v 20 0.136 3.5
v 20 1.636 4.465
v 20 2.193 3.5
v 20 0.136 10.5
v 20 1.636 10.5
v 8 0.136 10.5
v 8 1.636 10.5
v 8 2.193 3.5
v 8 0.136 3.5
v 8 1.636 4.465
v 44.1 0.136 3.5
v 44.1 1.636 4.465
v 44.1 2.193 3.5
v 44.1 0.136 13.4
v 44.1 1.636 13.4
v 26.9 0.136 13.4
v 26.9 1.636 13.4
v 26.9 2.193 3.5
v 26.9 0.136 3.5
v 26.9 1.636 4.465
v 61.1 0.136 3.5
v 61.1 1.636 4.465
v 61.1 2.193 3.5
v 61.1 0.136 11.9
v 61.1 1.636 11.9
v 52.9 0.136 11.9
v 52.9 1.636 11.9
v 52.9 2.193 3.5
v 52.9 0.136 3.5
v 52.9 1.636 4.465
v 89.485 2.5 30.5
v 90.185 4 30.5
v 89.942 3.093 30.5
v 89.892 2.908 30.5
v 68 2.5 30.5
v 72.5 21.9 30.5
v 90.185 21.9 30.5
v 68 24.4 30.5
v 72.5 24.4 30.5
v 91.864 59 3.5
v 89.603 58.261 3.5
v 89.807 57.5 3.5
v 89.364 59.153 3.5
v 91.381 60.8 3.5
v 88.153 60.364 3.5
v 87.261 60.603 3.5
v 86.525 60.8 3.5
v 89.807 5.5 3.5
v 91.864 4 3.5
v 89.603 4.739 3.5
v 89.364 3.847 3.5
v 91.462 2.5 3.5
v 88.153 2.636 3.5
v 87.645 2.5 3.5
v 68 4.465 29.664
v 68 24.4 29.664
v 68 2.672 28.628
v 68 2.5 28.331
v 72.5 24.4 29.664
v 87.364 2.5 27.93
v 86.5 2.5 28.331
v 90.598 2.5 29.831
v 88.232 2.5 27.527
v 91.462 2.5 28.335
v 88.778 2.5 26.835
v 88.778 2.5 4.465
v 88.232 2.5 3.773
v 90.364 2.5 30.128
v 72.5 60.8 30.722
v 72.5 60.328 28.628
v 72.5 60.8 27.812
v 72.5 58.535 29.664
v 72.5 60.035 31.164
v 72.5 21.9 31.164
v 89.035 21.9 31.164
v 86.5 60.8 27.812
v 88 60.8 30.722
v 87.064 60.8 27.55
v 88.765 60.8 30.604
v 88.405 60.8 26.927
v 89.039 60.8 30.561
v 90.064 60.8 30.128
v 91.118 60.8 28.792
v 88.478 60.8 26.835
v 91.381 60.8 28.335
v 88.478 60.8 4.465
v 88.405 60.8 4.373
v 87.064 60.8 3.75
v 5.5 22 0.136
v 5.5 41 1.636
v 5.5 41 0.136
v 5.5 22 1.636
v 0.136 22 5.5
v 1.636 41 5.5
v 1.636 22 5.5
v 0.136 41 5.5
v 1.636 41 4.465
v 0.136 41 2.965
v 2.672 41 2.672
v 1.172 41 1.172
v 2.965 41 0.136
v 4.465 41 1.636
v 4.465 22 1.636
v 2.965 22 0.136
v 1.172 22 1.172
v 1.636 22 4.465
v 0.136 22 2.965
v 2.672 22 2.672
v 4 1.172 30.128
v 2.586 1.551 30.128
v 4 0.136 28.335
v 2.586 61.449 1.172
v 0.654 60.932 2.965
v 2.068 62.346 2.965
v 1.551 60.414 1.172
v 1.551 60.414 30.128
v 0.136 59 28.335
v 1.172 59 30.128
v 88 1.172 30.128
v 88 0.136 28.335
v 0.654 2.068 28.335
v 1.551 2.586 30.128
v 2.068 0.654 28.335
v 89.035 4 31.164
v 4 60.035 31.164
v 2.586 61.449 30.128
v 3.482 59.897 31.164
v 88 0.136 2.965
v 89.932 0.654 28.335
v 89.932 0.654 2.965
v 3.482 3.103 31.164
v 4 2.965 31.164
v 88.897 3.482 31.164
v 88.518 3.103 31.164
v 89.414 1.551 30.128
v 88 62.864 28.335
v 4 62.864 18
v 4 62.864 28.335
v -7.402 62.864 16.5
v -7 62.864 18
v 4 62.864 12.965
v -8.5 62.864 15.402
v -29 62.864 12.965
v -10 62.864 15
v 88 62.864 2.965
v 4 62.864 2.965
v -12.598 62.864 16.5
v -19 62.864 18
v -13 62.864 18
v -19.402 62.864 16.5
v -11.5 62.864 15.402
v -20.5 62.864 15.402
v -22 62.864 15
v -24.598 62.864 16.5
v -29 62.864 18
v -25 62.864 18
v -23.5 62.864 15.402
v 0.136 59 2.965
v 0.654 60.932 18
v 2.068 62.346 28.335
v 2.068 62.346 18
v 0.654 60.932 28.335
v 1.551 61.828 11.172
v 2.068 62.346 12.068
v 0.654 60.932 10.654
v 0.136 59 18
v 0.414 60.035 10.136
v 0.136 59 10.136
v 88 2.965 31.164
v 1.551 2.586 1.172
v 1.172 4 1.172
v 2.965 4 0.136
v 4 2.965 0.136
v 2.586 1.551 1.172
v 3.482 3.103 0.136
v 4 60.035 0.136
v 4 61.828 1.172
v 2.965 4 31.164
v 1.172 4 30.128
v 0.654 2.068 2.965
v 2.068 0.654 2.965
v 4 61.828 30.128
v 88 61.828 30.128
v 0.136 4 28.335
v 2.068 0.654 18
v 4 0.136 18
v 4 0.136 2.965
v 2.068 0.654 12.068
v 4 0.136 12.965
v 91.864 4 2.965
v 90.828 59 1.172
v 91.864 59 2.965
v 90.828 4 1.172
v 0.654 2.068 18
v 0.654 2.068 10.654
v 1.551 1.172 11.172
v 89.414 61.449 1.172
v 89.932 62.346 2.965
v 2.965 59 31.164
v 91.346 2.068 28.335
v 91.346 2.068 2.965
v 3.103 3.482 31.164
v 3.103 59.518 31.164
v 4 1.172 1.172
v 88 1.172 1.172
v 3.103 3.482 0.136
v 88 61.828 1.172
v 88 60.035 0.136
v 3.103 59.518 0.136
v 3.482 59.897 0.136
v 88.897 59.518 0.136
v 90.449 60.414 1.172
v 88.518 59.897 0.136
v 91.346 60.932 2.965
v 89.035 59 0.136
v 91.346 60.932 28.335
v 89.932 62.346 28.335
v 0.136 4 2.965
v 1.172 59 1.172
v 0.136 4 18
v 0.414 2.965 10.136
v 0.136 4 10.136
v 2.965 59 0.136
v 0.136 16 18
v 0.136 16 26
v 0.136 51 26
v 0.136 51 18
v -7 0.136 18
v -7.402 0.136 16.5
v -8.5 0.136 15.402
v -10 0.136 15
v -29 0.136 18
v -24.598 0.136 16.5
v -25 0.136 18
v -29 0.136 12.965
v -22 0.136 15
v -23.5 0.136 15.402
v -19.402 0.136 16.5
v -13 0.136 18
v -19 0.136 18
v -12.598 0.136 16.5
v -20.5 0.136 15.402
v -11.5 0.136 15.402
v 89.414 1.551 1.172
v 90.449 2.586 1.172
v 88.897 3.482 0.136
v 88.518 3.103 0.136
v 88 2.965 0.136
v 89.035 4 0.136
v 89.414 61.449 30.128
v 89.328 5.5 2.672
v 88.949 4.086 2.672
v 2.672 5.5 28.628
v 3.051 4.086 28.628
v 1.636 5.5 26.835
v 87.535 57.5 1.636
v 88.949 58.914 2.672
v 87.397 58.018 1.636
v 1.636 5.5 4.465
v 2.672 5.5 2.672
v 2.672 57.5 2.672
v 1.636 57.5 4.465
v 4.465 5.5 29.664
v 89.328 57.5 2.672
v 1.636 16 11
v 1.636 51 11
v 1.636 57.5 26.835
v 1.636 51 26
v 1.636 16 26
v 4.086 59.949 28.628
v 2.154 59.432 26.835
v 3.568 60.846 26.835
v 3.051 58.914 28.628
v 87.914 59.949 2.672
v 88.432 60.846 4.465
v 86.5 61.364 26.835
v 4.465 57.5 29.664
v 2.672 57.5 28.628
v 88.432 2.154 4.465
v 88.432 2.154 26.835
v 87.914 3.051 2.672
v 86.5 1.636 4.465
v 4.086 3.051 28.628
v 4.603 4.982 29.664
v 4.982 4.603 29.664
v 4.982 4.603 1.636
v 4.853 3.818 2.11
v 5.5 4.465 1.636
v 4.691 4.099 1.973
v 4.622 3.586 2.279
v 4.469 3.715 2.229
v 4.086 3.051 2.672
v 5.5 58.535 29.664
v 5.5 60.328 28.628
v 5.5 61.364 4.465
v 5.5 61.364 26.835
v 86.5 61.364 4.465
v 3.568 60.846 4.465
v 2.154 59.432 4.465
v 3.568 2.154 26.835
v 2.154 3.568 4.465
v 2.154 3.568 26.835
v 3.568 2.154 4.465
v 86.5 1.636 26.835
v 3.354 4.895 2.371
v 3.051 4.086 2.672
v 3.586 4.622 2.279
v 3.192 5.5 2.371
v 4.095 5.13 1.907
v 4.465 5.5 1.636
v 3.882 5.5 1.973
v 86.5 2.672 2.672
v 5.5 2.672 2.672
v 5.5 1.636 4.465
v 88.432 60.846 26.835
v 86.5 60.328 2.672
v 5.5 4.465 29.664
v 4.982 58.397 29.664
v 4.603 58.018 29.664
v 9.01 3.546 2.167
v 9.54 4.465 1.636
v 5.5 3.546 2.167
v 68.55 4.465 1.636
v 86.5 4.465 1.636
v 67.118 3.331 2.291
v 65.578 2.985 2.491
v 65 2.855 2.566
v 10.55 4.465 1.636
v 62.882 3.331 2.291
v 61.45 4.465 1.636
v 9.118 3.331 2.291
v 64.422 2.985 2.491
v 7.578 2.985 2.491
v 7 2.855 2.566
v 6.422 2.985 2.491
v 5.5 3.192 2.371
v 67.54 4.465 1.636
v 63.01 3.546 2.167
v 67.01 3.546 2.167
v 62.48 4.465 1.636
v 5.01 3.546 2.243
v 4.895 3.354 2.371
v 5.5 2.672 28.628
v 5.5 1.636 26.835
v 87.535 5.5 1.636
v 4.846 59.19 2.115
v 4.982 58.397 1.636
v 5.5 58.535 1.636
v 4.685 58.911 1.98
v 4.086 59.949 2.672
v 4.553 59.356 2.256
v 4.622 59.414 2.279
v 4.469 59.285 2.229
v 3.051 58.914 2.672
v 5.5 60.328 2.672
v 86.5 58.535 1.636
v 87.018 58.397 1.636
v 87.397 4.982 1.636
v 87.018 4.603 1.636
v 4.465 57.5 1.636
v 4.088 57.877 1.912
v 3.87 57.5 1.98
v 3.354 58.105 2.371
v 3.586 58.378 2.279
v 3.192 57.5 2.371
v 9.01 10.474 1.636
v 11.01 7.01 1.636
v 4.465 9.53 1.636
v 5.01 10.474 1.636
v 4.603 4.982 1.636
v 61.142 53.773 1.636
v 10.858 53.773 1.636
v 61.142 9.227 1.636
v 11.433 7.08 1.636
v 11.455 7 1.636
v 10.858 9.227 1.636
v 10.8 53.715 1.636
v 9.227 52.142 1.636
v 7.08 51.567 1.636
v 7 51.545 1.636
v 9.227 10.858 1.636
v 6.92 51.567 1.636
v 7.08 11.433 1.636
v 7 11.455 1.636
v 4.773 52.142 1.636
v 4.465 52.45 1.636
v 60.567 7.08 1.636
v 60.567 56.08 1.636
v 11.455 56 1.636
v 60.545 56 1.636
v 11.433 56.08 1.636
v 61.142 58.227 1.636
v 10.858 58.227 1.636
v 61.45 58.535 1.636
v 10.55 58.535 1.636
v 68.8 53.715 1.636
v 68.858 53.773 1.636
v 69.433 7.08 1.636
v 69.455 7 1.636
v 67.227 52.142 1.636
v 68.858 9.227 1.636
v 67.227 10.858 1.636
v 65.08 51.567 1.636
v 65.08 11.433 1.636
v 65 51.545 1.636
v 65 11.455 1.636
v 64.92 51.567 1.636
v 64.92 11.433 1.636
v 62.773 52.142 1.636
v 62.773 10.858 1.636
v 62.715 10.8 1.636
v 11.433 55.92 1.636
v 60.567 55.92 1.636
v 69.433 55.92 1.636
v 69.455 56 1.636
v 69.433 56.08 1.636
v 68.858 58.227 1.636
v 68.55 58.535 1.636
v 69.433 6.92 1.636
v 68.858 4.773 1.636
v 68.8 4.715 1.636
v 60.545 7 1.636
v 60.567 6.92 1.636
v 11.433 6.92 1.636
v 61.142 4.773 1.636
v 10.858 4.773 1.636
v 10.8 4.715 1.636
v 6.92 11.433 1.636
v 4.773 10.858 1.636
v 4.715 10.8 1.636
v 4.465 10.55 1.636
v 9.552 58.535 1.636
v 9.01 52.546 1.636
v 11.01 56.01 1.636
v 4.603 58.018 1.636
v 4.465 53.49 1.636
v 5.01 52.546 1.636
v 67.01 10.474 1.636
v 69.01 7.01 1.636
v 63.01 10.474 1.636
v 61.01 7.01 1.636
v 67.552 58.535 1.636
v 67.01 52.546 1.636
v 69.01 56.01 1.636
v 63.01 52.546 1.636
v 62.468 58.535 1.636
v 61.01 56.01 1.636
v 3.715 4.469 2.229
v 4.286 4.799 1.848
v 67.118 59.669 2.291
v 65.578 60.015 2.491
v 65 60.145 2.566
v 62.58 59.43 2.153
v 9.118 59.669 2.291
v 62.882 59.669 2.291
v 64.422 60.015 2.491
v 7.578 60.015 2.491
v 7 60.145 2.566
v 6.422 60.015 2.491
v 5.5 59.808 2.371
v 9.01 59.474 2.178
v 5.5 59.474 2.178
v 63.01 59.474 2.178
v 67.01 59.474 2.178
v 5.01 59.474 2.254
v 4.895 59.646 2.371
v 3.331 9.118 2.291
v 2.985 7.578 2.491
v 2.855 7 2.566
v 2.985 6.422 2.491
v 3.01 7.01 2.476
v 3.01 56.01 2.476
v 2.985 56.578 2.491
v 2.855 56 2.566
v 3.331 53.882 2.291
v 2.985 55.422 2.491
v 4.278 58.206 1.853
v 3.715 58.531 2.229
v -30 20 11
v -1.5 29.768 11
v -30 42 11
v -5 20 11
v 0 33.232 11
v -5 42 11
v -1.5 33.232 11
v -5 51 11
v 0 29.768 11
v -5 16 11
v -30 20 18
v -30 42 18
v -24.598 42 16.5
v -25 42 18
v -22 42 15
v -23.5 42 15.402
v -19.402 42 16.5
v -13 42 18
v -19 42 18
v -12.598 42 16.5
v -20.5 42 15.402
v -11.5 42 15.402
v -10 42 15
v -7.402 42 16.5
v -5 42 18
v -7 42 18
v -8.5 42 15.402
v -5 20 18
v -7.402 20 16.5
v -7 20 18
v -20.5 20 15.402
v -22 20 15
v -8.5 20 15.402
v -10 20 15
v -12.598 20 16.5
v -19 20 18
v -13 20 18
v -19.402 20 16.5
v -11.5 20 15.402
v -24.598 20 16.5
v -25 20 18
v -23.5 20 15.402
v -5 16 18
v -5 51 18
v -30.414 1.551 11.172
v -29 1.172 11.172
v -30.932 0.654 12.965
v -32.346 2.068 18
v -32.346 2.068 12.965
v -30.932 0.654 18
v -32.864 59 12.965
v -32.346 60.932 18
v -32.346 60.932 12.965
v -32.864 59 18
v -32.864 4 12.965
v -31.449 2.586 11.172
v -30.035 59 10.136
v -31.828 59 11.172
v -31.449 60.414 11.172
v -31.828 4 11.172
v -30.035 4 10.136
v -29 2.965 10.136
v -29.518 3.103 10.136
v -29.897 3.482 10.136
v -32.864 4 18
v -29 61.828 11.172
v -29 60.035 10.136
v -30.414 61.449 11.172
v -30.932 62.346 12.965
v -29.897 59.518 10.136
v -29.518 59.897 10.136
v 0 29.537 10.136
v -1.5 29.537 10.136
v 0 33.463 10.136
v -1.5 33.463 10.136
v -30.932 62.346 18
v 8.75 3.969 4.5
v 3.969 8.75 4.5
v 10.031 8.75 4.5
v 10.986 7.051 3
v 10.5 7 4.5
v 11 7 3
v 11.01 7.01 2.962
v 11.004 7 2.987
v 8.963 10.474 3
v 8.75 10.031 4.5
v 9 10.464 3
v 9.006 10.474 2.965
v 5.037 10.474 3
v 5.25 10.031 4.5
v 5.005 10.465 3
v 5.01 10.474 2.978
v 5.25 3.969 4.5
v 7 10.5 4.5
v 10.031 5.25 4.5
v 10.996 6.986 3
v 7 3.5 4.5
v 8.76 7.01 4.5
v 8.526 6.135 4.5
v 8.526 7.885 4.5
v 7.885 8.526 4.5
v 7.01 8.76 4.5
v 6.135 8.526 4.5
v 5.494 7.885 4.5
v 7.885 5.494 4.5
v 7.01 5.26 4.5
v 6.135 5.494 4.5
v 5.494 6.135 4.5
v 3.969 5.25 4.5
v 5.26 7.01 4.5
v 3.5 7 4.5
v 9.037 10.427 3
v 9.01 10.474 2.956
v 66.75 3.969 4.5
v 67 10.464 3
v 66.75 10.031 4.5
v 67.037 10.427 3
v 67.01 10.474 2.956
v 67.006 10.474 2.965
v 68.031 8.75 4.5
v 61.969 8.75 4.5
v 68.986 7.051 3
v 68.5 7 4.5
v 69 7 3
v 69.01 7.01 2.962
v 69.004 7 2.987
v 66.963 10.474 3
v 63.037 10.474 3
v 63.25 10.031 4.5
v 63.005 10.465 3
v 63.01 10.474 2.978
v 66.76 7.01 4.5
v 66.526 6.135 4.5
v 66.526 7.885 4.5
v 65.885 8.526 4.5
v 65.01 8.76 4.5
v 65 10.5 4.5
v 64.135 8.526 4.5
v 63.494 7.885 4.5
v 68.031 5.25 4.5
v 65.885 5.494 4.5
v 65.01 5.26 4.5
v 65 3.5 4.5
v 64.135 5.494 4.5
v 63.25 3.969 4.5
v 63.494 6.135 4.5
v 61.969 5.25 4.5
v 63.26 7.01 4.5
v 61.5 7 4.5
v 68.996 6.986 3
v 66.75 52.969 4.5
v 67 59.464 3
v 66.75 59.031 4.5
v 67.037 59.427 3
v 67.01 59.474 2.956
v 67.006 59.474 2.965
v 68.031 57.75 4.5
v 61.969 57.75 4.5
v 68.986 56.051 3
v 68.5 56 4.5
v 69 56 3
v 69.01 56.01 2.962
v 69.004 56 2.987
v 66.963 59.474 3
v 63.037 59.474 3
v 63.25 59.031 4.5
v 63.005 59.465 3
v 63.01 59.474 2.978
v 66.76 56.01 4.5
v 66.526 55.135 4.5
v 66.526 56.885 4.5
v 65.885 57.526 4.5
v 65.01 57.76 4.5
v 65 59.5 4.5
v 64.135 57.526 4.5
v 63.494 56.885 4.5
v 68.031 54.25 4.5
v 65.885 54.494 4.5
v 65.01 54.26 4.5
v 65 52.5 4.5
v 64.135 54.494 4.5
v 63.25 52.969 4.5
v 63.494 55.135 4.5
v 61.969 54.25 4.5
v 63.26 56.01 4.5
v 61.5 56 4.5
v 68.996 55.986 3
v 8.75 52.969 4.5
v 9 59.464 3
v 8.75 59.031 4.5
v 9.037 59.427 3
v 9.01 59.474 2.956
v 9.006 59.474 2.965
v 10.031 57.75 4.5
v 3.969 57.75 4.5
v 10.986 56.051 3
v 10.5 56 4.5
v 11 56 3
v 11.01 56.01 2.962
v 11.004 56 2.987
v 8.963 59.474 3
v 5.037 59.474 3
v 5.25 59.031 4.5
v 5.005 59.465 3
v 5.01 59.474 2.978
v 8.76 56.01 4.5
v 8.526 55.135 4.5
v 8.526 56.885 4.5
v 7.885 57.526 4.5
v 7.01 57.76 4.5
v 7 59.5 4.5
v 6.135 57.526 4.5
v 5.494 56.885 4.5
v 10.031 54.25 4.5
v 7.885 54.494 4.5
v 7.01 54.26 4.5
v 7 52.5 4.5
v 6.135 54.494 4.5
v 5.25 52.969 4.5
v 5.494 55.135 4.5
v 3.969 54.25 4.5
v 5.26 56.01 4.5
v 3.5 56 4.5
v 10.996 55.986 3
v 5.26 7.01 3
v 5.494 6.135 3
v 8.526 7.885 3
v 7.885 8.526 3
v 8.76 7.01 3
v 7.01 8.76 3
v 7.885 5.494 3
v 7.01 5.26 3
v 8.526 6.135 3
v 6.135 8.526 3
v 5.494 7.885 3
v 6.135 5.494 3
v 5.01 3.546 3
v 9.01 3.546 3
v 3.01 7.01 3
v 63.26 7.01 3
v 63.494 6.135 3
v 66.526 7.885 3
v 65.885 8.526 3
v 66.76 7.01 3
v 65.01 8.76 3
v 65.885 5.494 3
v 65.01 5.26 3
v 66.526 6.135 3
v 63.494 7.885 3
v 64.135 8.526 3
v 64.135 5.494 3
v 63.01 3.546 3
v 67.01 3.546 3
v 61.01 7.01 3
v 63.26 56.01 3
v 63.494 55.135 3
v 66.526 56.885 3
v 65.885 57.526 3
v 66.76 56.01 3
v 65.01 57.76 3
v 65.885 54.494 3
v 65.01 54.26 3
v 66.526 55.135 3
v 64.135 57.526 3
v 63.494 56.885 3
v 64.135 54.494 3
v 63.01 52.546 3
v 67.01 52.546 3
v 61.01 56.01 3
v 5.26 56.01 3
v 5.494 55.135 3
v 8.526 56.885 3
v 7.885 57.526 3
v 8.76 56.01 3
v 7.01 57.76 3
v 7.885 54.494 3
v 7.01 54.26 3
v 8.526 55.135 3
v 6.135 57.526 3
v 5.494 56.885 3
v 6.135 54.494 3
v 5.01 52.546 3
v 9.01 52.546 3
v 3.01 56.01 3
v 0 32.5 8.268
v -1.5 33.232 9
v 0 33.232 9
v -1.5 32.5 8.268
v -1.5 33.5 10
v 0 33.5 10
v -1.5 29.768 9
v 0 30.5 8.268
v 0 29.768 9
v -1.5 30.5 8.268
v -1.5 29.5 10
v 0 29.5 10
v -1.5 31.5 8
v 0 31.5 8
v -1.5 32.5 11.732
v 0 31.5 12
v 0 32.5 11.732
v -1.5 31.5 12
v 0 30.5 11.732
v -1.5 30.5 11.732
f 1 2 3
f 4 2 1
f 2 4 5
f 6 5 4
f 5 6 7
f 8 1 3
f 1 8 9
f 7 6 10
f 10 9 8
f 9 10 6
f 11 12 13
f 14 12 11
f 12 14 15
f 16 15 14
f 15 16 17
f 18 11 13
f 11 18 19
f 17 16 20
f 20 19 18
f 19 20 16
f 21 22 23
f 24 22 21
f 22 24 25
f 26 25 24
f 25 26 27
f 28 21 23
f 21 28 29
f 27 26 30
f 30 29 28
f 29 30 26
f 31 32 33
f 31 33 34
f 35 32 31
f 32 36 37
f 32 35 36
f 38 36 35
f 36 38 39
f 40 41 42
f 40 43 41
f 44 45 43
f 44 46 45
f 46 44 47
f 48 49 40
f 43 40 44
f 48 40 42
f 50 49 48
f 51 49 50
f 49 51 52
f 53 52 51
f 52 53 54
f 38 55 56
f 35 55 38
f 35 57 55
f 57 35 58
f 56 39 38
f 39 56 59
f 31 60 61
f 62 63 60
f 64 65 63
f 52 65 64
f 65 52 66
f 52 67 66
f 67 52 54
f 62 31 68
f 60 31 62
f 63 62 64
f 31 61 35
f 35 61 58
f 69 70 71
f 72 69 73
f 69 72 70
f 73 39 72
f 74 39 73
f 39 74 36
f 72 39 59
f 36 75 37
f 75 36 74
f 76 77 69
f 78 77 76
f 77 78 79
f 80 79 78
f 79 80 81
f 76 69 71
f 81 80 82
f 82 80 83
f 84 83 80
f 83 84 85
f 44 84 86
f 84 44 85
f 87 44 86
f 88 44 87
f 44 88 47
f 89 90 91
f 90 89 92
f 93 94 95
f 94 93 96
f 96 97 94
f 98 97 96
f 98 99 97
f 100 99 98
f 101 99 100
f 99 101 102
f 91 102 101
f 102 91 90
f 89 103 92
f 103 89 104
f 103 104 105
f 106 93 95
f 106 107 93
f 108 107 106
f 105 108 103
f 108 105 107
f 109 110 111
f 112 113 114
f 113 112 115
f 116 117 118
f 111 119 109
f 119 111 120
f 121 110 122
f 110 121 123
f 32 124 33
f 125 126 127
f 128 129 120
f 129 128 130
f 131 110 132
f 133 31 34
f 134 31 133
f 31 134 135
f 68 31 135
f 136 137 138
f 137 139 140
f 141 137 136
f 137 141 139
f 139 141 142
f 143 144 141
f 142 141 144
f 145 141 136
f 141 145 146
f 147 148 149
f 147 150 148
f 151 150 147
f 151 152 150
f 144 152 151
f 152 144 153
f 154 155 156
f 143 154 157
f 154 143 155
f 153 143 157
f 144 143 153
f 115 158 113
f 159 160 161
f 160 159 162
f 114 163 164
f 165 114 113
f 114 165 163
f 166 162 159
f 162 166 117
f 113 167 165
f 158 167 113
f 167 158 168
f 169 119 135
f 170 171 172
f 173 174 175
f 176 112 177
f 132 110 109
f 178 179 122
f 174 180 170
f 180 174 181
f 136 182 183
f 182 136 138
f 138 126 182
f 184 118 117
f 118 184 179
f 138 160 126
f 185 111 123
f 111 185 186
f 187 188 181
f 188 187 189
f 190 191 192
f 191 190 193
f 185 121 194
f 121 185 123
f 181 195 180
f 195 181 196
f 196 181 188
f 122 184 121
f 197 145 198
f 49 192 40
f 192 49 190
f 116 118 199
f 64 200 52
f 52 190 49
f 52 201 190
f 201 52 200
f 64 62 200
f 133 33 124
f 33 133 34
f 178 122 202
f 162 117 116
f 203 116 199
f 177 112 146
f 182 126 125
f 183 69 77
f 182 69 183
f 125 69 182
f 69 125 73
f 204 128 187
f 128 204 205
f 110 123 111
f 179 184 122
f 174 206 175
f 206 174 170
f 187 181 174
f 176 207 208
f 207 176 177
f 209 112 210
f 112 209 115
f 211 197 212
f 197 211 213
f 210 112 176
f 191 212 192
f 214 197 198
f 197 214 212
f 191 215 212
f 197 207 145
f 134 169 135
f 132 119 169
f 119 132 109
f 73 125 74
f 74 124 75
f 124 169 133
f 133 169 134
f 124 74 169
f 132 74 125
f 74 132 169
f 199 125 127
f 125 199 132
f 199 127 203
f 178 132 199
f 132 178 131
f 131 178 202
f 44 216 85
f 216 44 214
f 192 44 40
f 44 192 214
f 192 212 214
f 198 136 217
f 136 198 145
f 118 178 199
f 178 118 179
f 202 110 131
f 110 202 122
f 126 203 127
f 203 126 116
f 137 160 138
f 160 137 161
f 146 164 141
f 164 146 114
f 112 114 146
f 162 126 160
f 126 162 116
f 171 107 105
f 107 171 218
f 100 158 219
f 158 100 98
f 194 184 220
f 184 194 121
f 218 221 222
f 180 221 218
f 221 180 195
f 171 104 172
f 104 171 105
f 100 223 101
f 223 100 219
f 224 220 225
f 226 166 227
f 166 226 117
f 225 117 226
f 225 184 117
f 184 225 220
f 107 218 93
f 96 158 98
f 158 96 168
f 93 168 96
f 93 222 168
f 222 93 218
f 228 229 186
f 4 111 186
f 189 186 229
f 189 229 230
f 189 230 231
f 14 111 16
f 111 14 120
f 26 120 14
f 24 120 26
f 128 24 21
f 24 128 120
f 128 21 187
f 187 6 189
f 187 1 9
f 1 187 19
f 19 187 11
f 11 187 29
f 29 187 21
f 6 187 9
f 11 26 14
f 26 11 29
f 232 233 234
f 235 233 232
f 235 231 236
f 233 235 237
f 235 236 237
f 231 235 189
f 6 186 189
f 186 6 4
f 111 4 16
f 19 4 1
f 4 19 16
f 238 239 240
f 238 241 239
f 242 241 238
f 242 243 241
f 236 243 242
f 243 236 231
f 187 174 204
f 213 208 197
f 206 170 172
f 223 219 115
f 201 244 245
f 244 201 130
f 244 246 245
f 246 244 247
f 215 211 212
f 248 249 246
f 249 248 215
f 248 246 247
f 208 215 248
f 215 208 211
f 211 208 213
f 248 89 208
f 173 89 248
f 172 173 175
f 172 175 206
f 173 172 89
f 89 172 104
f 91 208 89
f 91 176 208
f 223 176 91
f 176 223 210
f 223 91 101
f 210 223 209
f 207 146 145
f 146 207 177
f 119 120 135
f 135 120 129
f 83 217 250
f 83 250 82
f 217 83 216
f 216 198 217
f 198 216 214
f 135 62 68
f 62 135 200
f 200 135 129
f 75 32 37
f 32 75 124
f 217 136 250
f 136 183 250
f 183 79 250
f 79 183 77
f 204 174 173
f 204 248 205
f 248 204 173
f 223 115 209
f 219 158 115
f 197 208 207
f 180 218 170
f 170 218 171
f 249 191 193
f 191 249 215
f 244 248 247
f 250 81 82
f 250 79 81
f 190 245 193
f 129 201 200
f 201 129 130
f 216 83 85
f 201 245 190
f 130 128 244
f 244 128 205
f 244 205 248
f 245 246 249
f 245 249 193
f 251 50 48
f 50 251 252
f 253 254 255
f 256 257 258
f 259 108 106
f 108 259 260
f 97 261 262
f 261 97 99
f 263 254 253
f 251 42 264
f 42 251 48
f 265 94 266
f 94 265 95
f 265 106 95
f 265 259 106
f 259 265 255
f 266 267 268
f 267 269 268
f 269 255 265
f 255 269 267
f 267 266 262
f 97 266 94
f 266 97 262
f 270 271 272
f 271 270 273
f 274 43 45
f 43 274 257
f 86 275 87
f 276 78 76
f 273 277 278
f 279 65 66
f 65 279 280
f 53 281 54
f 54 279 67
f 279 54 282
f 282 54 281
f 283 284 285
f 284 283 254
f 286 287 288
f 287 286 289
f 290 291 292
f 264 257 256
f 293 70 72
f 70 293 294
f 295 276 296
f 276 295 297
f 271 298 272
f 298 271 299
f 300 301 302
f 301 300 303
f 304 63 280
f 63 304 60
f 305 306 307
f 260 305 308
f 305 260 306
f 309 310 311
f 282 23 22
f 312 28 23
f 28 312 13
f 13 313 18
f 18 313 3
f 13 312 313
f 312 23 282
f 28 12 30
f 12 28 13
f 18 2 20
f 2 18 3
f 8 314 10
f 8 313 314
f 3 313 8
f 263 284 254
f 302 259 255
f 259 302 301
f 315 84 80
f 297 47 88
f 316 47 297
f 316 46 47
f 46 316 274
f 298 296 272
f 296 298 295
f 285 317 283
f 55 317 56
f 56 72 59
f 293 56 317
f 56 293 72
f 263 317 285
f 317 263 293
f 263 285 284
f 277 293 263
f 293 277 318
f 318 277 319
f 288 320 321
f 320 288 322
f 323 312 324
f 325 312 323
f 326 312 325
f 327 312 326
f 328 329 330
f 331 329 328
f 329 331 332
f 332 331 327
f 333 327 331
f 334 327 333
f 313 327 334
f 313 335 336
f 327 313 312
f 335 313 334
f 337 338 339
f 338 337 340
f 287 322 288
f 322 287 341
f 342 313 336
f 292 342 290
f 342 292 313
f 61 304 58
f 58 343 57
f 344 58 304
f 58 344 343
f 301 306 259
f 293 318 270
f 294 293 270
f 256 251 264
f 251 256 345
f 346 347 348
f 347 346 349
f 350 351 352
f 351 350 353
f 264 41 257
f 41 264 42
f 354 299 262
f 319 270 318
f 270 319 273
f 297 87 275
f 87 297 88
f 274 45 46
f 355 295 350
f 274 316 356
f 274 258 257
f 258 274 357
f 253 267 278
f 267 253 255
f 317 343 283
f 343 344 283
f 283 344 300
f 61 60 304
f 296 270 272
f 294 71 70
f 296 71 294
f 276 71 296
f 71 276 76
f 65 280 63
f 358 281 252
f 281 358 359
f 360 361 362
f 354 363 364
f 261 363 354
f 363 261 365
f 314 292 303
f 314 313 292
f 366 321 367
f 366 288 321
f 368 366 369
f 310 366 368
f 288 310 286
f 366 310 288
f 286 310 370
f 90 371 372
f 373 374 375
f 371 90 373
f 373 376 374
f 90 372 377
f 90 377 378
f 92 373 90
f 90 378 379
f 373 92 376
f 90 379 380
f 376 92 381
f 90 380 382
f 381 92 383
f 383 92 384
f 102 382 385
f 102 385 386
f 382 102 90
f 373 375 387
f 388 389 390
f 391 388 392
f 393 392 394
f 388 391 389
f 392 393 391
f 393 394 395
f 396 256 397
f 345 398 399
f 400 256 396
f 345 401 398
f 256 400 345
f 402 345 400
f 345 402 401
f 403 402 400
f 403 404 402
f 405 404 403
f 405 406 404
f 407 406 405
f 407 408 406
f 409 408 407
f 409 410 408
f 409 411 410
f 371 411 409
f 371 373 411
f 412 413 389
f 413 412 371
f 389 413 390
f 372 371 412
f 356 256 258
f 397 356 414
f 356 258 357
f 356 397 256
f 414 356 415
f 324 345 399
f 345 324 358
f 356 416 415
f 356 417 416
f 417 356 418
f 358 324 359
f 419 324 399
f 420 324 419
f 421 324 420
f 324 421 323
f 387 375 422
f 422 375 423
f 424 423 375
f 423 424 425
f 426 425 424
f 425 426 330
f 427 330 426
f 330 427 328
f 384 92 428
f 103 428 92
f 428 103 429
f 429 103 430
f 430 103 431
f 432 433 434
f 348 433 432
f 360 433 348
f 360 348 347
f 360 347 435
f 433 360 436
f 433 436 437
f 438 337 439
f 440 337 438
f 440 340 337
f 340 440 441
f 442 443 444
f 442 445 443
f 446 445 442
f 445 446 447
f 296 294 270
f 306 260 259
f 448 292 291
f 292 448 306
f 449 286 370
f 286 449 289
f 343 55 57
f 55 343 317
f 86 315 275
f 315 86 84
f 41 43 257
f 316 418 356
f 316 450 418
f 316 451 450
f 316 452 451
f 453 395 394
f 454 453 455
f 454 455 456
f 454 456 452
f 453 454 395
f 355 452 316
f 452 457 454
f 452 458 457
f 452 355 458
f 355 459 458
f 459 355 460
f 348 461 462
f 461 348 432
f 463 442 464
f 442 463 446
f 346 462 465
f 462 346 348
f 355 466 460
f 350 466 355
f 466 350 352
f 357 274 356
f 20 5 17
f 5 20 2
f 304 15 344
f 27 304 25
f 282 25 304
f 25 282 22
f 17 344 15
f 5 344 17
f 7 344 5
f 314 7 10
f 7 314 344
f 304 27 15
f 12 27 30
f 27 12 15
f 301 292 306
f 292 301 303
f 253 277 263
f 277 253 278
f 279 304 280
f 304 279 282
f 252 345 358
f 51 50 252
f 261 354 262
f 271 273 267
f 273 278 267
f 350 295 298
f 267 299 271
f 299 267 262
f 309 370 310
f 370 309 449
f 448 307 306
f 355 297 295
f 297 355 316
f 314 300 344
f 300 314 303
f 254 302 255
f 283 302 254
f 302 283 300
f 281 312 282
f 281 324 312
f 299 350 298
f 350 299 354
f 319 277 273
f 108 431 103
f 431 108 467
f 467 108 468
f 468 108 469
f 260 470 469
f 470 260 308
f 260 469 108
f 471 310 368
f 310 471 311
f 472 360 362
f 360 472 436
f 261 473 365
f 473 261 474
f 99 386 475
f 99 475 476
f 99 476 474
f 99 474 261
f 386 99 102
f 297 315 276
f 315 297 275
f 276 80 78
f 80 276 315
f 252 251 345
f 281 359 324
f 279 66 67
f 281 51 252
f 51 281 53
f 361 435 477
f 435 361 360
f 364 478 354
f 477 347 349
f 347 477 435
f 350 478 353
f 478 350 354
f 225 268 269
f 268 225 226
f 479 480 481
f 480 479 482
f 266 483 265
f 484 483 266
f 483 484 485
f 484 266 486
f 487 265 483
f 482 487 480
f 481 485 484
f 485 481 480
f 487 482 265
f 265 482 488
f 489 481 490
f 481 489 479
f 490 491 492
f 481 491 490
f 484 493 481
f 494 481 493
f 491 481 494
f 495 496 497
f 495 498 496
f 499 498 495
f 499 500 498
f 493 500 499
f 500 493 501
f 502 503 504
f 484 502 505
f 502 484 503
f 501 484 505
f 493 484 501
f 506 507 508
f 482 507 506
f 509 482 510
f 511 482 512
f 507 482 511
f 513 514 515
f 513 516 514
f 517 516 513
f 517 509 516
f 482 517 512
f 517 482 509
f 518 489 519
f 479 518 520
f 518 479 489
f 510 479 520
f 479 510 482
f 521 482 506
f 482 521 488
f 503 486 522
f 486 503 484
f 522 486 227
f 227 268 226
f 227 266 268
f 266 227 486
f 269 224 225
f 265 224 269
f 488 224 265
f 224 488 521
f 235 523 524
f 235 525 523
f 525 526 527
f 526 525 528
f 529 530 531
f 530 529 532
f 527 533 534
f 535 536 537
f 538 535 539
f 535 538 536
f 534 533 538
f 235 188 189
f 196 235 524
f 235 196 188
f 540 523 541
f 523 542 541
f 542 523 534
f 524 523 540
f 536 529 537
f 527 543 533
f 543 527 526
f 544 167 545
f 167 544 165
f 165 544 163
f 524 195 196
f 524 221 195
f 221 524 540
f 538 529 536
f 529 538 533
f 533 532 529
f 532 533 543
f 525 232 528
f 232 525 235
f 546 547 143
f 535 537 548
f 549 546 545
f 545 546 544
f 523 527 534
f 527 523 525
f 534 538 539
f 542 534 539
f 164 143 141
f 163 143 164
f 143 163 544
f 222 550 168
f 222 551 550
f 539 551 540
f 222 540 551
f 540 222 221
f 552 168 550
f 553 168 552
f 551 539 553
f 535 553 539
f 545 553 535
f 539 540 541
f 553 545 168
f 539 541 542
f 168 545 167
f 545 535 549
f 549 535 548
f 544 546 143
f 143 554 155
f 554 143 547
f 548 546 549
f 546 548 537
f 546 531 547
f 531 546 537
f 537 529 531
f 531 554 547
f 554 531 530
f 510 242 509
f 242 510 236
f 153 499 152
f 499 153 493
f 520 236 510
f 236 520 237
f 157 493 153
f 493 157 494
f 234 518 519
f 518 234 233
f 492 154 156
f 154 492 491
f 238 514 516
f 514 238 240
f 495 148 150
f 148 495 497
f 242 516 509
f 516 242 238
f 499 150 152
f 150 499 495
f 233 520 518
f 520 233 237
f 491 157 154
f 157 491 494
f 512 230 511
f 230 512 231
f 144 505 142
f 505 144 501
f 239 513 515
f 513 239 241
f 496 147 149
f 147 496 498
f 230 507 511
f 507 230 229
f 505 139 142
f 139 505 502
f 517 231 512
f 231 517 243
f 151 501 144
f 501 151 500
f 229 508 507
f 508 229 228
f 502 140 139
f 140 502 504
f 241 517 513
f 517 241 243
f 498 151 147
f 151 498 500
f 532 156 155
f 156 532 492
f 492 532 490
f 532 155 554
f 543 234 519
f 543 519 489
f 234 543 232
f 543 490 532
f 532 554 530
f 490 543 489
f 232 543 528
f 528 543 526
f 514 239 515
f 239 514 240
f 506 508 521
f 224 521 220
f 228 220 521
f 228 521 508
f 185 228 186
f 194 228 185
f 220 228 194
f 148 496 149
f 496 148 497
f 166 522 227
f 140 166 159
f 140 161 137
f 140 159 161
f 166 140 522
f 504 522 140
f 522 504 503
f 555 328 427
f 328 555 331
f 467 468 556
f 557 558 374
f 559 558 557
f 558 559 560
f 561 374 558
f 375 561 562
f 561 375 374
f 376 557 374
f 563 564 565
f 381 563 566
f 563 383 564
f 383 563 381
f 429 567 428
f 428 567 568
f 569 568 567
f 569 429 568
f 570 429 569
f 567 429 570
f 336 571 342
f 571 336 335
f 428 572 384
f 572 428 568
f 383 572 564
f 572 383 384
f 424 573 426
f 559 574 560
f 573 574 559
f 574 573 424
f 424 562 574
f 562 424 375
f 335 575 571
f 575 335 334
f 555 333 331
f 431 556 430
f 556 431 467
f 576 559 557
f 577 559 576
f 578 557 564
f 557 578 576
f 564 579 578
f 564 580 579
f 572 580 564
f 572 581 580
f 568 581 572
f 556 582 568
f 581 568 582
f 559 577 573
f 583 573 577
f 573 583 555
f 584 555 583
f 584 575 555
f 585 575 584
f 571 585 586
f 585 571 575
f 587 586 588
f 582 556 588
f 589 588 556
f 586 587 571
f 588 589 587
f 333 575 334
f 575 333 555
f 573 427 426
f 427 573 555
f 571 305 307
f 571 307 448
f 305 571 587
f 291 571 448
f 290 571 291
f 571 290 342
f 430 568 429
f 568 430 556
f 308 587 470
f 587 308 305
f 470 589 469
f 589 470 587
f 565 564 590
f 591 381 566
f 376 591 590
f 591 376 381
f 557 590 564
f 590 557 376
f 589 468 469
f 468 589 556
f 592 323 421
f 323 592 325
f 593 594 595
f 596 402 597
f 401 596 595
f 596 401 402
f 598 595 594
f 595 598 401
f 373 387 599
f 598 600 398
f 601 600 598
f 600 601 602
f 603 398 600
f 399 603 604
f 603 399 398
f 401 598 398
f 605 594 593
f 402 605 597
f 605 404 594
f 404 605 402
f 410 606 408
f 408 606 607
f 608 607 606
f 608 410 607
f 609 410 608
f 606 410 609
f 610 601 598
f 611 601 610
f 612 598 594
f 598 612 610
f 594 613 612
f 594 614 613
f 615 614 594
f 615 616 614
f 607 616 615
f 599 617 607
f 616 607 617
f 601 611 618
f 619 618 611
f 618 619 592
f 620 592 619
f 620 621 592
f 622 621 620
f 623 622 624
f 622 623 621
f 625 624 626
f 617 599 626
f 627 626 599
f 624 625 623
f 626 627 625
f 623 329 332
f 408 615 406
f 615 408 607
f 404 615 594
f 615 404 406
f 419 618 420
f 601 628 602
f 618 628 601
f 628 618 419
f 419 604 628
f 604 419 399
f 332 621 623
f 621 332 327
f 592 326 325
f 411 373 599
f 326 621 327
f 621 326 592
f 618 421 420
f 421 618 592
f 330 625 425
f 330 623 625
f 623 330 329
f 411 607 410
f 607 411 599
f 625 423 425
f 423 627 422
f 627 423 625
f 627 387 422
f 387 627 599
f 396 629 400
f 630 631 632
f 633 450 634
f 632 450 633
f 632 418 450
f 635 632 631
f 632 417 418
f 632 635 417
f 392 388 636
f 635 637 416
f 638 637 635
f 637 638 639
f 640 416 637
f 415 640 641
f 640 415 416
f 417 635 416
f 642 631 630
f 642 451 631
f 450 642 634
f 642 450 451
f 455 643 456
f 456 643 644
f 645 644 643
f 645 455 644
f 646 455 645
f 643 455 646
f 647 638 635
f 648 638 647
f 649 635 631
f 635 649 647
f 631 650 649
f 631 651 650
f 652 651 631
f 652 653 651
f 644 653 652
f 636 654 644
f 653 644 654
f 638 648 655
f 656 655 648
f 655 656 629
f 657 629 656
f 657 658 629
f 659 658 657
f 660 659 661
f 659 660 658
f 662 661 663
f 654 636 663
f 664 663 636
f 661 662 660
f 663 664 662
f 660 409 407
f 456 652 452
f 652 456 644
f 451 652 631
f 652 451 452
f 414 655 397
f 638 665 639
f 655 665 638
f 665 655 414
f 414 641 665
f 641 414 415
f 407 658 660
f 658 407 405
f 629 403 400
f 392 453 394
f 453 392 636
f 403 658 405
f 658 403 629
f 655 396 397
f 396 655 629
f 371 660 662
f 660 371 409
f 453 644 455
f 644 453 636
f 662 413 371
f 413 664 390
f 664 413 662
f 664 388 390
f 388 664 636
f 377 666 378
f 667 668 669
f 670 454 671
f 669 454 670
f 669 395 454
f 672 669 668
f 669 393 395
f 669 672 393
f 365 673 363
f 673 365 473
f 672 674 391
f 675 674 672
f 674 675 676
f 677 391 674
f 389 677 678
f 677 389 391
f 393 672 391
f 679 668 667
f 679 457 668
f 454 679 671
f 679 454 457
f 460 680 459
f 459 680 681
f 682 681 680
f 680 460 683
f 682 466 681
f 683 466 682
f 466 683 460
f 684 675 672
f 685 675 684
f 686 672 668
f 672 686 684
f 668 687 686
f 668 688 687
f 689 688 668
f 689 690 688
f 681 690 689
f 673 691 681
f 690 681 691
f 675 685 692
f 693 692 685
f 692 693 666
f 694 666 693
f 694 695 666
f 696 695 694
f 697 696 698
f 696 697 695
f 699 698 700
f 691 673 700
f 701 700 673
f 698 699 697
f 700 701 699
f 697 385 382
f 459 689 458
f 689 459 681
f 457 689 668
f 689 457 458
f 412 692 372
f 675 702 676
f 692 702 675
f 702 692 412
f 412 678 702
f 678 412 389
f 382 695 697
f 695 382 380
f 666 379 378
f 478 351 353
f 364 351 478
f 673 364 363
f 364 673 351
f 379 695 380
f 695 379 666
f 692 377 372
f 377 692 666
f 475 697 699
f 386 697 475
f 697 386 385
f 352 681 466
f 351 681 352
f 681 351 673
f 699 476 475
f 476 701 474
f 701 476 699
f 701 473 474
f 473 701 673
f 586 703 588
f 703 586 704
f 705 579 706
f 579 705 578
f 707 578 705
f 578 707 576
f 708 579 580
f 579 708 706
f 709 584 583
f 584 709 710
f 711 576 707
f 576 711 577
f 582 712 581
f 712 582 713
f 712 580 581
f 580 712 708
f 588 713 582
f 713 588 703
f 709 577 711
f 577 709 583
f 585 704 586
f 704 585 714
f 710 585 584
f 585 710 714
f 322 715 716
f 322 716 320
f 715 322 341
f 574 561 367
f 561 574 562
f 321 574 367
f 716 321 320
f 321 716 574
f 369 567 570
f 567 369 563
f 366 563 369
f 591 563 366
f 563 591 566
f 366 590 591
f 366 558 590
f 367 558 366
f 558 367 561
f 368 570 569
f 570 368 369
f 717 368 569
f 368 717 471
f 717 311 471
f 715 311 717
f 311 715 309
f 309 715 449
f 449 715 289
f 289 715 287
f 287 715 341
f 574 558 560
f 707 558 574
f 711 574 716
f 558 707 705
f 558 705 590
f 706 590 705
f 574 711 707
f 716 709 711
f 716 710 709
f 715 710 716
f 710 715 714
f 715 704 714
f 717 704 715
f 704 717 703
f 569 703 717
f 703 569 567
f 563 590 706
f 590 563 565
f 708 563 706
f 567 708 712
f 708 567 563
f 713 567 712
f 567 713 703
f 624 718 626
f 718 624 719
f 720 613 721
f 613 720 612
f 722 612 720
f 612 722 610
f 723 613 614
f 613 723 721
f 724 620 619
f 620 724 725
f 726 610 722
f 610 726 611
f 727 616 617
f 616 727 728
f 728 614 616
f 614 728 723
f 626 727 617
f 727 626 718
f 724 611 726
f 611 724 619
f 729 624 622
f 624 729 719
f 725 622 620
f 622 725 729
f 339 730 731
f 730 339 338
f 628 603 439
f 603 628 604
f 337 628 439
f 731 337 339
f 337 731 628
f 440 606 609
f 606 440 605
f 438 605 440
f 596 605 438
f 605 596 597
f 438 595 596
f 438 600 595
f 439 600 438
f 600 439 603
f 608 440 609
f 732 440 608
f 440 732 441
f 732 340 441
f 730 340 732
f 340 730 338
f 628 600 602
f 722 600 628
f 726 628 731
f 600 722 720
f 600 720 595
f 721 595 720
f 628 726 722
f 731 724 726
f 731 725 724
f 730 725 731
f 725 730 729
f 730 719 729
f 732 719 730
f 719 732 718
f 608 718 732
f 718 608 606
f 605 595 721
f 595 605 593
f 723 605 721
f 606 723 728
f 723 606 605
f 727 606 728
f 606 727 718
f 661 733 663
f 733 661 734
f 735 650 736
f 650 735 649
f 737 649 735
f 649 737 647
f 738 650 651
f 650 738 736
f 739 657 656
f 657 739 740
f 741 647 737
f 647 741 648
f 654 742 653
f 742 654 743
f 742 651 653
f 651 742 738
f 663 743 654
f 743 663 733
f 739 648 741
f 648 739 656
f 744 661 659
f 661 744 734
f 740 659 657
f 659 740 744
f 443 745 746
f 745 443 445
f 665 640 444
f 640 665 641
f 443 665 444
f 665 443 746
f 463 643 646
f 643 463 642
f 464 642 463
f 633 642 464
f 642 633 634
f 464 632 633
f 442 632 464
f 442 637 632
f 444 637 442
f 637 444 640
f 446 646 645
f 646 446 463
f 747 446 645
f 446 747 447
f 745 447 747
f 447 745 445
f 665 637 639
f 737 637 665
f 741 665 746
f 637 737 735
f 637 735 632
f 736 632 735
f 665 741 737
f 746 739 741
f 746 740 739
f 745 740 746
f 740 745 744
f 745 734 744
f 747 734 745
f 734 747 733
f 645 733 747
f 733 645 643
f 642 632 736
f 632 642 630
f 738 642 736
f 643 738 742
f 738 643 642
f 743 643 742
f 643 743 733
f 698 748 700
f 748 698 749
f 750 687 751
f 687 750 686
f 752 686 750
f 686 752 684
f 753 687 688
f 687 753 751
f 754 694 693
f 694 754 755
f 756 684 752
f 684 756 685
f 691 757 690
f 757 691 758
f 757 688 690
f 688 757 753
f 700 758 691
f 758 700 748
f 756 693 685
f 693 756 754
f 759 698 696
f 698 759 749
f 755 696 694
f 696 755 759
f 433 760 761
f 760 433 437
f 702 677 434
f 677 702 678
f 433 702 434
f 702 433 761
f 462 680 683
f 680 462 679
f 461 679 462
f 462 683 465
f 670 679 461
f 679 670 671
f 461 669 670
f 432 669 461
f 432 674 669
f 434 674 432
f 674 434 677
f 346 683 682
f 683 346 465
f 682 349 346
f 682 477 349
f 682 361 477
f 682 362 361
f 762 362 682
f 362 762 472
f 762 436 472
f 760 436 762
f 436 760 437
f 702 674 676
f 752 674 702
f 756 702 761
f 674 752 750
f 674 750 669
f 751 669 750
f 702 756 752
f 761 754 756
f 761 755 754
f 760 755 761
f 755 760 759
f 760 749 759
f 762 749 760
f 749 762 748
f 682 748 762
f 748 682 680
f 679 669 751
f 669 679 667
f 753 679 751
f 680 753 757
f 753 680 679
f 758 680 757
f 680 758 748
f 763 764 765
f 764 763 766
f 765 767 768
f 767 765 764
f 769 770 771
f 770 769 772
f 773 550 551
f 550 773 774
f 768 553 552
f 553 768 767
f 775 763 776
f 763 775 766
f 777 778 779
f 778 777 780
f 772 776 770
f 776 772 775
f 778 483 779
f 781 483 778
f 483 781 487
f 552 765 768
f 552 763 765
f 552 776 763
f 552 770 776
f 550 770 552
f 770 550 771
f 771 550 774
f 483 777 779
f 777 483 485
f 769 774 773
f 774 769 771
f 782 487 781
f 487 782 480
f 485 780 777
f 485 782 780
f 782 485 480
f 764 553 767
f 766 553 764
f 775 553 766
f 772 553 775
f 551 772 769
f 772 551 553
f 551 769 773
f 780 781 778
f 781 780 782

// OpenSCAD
/*  RASPBERRY PI2 case
-- Parametric as below
-- Uses a set of measurements for box cutouts for devices
-- Rounded corners
*/
/* Rasberry Pi2 box (should fit B+ as well)
How it works:
    Make a rounded box
    Subtract the interior 
    Enlarge the devices so they protrude then subtract them.
    Slice top and bottom halves.
    Add lugs, holes and stand offs
*/

//extention
e_cr=3; //Cable Radius
e_cs=12; //Cable Spacing
e_csh=10; //Cable Shift
e_ch=18;  //Cable height

//box
board = [85, 56 , 1.3 ];  //dimension of rasp pi
t     = 1.40;             //Thickness of rasp pi board
p     = 1.5;              //Thickness of plastic case
g     = 2;                //gap around board
$fn   = 12;               //roundness of rendering
rb    = 4;                //roundness of box
huge  = 200;              // for drilling out holes etc 
stand_off = 3;            //raise board above bottom plastic
box   = board + [7 , 7, 30];  //outside dimensions of our case
bh    = 10;               //Where to slice box
d = 3.5;                  //displacement of hole from edge  
eps = 0.01;               //a very tiny value
/*
Actual device sizes and positions (some already extend over edge of board)
most of these numbers are measurements or off spec sheet
NOTE KEEPING TRACK OF COORDINATE SYSTEMS IS CRITICAL
These are measured  coordinates with zero point at BOTTOM lefthand corner of board

device = [[position of device],[device size],[adjust hole position], [enlarge device for hole]]
*/ 

micro =  [[6.5  ,-1.5 ,0] ,[8    ,6     , 3   ] ,[-1, -10,    0] , [2,   4,  2  ]];
hdmi  =  [[24.4 ,-2   ,0] ,[15.2 ,12    , 7.9 ] ,[0,  -10,    0] , [0,  10,  0  ]];
camera=  [[43   ,0    ,0] ,[4    ,22.4  , 7   ] ,[0,    0,    0] , [0,   0, 10  ]];
audio =  [[50.4 ,-2   ,0] ,[6.2  ,14.5  , 6.4 ] ,[0,  -10,    0] , [0,  10,  0  ]];
ether =  [[65.5 ,2    ,0] ,[21.2 ,15.9  , 15  ] ,[0,   -2,    0] , [5,   4, 10  ]];
//widen usb and ether so we dont have a thin vertical strip of weak plastic
usb1  =  [[70   ,21.4 ,0] ,[17.4 ,15.3  , 17.4] ,[0,   -2,    0] , [0,   4, 10  ]];
usb2  =  [[70   ,39   ,0] ,[17.4 ,15.3  , 17.4] ,[0,   -2,    0] , [0,   4, 10  ]];
gpio  =  [[7.2  ,50   ,0] ,[50   ,5.1   , 9   ] ,[0,    0,    0] , [0,   0, 10  ]];
display= [[1.5  ,17   ,0] ,[3.9  ,22.3  , 6   ] ,[0,    0,    0] , [0,   0, 10  ]];
//SD is below the board so needs to drop a fair bit to give access to the card
SD    =  [[-3  ,19.5 ,-2.5] ,[14   ,17  , 2.5 ] ,[-16,   0,    -4] , [6,   0,  4  ]];
// make a list so we can handle our devices as a group 
echidna = [micro,hdmi,camera,audio,ether,usb1,usb2,gpio,display,SD];  

shift =[p+g,p+g,p+stand_off];  //plastic + gap at edge and height of screw pad
holes =  [[p+g+d, p+g+d], [65, p+g+d], [65, 56], [p+g+d, 56]]  ;
toplugs =[
          [[box[0]*4/5,p+p/2, box[2]-bh],[90,0,0]],
          [[box[0]*4/5,box[1]-p-p/2,bh], [90,0,0]],
          [[p+p/2,box[1]*3/4-p-p,bh],[0,90,0]],
          [[p+p/2,box[1]/4-p-p,bh],[0,90,0]]
          ];        
 bottomlug =[[-p/2,box[1]/2,bh],[0,90,0]];

//Utility module to make a solid box with rounded corners
module hull_build(box,r){
    //spheres at the corners of a box and run hull over it
    x = box  - 2 * [r,r,r];
    difference(){
    hull(){
        for (i=[0:1]){
            for (j=[0:1]) {
                for (k=[0:1]){
                        translate([i*x[0],j*x[1],k*x[2]]+[r,r,r]) //move up r because we moved box up
                            sphere(r);
                            }            
                        }   
                    }  
              }   
         }  
}


module complete_box(){
    embiggen = [2,2,2]; // make holes 1mm bigger all round
    //substract devices out of our case
    difference(){
        hull_build(box,rb); //outer shell
        translate([p,p,p])hull_build(box-[p+p,p+p,p+p],rb);  //smaller box(interior)
    //move, embiggen then subtract
        for (i=echidna) {
            translate(i[0] + i[2] + shift -embiggen/2) 
                    cube(i[1]+ i[3] + embiggen);
                        }
                }
   }
   
module stand_off() {
    difference(){
        union(){
            children();  // this will the complete_box
            for (q=holes){
                translate([q[0],q[1],p+3/2]) 
                    cylinder(d1=9,d2=7,h=3,center=true); 
            }

        }  
        //put in eps to stop an error warning
        for (q=holes){
        translate([q[0]+eps,q[1]+eps,3/2]){
            cylinder(d=3.5,h=huge,center=true);
                cylinder(d=8,h=3,center=true,$fn=6);  
        }
    }
    }
}

module top_holes(){
    difference(){
        union(){
            children();  //this will be complete_box
            for (q=holes){
            translate([q[0],q[1],box[2]-p-p]) 
                    cylinder(d=3+p+p,h=3,center=true); //reinforcing plastic around top hole
            }
        }  
        for (q=holes){
        translate([q[0],q[1],3/2]){
           cylinder(d=3.5,h=huge,center=true);
        }
    }
    }
}


module bottom(){
difference() {
        //Add standoff and drill holes at same time
        stand_off(holes) complete_box();
        translate([-20,-20,bh])cube(huge);  //chop the top off
    }
    
    //put a lug at the end to stabilise the lid before screwing
        translate(bottomlug[0])
            rotate(bottomlug[1])
                cylinder(d=4,h=p,center=true);
}

module top(){

    difference(){
    intersection() {
        top_holes(holes)complete_box();  
        translate([-5,-11,bh])cube(huge);   //chop the bottom (note use of intersection)
        }
     }
     
     //Add 2 lugs at the end and one on each side [[position,rotation],..]
     for (lug = toplugs) {
            translate(lug[0]) 
                    rotate(lug[1]) 
                            cylinder(d=4,h=p,center=true);
        }
}//top
 
module cavity()
{union(){
  translate([-30,20,11]) cube([55,22,15]);
  translate([ -5,16,11]) cube([22,35,15]);}
}//cavity

//for designing
///box
difference(){
complete_box();
cavity();
}//diff. cabling

//cutting cube
xy=111;
difference(){//printing
///extention
difference(){
color("limegreen") difference(){
  translate([-33,0,10])hull_build(box-[50,0,10],rb); //outer shell extention
  translate([p,p,p])hull_build(box-[p+p,p+p,p+p],rb);//smaller box(interior)
}//diff. extention
translate([-e_csh,88,e_ch]) union(){translate([-e_cs,0,0]) rotate([90,0,0]) cylinder(r=e_cr, h=111); rotate([90,0,0]) cylinder(r=e_cr, h=111);}
cavity();
}//diff. pipes and cabling

//for printing
//top cube cutting
//TODO
translate([-xy/2,-xy/3,e_ch]) cube([xy,xy,33]);
//bottom cube cutting
//TODO
}//diff. printing

bottom();
//flip it over to print and move it to print
//translate([box[0],0,box[2]])rotate([0,180,0])top();
